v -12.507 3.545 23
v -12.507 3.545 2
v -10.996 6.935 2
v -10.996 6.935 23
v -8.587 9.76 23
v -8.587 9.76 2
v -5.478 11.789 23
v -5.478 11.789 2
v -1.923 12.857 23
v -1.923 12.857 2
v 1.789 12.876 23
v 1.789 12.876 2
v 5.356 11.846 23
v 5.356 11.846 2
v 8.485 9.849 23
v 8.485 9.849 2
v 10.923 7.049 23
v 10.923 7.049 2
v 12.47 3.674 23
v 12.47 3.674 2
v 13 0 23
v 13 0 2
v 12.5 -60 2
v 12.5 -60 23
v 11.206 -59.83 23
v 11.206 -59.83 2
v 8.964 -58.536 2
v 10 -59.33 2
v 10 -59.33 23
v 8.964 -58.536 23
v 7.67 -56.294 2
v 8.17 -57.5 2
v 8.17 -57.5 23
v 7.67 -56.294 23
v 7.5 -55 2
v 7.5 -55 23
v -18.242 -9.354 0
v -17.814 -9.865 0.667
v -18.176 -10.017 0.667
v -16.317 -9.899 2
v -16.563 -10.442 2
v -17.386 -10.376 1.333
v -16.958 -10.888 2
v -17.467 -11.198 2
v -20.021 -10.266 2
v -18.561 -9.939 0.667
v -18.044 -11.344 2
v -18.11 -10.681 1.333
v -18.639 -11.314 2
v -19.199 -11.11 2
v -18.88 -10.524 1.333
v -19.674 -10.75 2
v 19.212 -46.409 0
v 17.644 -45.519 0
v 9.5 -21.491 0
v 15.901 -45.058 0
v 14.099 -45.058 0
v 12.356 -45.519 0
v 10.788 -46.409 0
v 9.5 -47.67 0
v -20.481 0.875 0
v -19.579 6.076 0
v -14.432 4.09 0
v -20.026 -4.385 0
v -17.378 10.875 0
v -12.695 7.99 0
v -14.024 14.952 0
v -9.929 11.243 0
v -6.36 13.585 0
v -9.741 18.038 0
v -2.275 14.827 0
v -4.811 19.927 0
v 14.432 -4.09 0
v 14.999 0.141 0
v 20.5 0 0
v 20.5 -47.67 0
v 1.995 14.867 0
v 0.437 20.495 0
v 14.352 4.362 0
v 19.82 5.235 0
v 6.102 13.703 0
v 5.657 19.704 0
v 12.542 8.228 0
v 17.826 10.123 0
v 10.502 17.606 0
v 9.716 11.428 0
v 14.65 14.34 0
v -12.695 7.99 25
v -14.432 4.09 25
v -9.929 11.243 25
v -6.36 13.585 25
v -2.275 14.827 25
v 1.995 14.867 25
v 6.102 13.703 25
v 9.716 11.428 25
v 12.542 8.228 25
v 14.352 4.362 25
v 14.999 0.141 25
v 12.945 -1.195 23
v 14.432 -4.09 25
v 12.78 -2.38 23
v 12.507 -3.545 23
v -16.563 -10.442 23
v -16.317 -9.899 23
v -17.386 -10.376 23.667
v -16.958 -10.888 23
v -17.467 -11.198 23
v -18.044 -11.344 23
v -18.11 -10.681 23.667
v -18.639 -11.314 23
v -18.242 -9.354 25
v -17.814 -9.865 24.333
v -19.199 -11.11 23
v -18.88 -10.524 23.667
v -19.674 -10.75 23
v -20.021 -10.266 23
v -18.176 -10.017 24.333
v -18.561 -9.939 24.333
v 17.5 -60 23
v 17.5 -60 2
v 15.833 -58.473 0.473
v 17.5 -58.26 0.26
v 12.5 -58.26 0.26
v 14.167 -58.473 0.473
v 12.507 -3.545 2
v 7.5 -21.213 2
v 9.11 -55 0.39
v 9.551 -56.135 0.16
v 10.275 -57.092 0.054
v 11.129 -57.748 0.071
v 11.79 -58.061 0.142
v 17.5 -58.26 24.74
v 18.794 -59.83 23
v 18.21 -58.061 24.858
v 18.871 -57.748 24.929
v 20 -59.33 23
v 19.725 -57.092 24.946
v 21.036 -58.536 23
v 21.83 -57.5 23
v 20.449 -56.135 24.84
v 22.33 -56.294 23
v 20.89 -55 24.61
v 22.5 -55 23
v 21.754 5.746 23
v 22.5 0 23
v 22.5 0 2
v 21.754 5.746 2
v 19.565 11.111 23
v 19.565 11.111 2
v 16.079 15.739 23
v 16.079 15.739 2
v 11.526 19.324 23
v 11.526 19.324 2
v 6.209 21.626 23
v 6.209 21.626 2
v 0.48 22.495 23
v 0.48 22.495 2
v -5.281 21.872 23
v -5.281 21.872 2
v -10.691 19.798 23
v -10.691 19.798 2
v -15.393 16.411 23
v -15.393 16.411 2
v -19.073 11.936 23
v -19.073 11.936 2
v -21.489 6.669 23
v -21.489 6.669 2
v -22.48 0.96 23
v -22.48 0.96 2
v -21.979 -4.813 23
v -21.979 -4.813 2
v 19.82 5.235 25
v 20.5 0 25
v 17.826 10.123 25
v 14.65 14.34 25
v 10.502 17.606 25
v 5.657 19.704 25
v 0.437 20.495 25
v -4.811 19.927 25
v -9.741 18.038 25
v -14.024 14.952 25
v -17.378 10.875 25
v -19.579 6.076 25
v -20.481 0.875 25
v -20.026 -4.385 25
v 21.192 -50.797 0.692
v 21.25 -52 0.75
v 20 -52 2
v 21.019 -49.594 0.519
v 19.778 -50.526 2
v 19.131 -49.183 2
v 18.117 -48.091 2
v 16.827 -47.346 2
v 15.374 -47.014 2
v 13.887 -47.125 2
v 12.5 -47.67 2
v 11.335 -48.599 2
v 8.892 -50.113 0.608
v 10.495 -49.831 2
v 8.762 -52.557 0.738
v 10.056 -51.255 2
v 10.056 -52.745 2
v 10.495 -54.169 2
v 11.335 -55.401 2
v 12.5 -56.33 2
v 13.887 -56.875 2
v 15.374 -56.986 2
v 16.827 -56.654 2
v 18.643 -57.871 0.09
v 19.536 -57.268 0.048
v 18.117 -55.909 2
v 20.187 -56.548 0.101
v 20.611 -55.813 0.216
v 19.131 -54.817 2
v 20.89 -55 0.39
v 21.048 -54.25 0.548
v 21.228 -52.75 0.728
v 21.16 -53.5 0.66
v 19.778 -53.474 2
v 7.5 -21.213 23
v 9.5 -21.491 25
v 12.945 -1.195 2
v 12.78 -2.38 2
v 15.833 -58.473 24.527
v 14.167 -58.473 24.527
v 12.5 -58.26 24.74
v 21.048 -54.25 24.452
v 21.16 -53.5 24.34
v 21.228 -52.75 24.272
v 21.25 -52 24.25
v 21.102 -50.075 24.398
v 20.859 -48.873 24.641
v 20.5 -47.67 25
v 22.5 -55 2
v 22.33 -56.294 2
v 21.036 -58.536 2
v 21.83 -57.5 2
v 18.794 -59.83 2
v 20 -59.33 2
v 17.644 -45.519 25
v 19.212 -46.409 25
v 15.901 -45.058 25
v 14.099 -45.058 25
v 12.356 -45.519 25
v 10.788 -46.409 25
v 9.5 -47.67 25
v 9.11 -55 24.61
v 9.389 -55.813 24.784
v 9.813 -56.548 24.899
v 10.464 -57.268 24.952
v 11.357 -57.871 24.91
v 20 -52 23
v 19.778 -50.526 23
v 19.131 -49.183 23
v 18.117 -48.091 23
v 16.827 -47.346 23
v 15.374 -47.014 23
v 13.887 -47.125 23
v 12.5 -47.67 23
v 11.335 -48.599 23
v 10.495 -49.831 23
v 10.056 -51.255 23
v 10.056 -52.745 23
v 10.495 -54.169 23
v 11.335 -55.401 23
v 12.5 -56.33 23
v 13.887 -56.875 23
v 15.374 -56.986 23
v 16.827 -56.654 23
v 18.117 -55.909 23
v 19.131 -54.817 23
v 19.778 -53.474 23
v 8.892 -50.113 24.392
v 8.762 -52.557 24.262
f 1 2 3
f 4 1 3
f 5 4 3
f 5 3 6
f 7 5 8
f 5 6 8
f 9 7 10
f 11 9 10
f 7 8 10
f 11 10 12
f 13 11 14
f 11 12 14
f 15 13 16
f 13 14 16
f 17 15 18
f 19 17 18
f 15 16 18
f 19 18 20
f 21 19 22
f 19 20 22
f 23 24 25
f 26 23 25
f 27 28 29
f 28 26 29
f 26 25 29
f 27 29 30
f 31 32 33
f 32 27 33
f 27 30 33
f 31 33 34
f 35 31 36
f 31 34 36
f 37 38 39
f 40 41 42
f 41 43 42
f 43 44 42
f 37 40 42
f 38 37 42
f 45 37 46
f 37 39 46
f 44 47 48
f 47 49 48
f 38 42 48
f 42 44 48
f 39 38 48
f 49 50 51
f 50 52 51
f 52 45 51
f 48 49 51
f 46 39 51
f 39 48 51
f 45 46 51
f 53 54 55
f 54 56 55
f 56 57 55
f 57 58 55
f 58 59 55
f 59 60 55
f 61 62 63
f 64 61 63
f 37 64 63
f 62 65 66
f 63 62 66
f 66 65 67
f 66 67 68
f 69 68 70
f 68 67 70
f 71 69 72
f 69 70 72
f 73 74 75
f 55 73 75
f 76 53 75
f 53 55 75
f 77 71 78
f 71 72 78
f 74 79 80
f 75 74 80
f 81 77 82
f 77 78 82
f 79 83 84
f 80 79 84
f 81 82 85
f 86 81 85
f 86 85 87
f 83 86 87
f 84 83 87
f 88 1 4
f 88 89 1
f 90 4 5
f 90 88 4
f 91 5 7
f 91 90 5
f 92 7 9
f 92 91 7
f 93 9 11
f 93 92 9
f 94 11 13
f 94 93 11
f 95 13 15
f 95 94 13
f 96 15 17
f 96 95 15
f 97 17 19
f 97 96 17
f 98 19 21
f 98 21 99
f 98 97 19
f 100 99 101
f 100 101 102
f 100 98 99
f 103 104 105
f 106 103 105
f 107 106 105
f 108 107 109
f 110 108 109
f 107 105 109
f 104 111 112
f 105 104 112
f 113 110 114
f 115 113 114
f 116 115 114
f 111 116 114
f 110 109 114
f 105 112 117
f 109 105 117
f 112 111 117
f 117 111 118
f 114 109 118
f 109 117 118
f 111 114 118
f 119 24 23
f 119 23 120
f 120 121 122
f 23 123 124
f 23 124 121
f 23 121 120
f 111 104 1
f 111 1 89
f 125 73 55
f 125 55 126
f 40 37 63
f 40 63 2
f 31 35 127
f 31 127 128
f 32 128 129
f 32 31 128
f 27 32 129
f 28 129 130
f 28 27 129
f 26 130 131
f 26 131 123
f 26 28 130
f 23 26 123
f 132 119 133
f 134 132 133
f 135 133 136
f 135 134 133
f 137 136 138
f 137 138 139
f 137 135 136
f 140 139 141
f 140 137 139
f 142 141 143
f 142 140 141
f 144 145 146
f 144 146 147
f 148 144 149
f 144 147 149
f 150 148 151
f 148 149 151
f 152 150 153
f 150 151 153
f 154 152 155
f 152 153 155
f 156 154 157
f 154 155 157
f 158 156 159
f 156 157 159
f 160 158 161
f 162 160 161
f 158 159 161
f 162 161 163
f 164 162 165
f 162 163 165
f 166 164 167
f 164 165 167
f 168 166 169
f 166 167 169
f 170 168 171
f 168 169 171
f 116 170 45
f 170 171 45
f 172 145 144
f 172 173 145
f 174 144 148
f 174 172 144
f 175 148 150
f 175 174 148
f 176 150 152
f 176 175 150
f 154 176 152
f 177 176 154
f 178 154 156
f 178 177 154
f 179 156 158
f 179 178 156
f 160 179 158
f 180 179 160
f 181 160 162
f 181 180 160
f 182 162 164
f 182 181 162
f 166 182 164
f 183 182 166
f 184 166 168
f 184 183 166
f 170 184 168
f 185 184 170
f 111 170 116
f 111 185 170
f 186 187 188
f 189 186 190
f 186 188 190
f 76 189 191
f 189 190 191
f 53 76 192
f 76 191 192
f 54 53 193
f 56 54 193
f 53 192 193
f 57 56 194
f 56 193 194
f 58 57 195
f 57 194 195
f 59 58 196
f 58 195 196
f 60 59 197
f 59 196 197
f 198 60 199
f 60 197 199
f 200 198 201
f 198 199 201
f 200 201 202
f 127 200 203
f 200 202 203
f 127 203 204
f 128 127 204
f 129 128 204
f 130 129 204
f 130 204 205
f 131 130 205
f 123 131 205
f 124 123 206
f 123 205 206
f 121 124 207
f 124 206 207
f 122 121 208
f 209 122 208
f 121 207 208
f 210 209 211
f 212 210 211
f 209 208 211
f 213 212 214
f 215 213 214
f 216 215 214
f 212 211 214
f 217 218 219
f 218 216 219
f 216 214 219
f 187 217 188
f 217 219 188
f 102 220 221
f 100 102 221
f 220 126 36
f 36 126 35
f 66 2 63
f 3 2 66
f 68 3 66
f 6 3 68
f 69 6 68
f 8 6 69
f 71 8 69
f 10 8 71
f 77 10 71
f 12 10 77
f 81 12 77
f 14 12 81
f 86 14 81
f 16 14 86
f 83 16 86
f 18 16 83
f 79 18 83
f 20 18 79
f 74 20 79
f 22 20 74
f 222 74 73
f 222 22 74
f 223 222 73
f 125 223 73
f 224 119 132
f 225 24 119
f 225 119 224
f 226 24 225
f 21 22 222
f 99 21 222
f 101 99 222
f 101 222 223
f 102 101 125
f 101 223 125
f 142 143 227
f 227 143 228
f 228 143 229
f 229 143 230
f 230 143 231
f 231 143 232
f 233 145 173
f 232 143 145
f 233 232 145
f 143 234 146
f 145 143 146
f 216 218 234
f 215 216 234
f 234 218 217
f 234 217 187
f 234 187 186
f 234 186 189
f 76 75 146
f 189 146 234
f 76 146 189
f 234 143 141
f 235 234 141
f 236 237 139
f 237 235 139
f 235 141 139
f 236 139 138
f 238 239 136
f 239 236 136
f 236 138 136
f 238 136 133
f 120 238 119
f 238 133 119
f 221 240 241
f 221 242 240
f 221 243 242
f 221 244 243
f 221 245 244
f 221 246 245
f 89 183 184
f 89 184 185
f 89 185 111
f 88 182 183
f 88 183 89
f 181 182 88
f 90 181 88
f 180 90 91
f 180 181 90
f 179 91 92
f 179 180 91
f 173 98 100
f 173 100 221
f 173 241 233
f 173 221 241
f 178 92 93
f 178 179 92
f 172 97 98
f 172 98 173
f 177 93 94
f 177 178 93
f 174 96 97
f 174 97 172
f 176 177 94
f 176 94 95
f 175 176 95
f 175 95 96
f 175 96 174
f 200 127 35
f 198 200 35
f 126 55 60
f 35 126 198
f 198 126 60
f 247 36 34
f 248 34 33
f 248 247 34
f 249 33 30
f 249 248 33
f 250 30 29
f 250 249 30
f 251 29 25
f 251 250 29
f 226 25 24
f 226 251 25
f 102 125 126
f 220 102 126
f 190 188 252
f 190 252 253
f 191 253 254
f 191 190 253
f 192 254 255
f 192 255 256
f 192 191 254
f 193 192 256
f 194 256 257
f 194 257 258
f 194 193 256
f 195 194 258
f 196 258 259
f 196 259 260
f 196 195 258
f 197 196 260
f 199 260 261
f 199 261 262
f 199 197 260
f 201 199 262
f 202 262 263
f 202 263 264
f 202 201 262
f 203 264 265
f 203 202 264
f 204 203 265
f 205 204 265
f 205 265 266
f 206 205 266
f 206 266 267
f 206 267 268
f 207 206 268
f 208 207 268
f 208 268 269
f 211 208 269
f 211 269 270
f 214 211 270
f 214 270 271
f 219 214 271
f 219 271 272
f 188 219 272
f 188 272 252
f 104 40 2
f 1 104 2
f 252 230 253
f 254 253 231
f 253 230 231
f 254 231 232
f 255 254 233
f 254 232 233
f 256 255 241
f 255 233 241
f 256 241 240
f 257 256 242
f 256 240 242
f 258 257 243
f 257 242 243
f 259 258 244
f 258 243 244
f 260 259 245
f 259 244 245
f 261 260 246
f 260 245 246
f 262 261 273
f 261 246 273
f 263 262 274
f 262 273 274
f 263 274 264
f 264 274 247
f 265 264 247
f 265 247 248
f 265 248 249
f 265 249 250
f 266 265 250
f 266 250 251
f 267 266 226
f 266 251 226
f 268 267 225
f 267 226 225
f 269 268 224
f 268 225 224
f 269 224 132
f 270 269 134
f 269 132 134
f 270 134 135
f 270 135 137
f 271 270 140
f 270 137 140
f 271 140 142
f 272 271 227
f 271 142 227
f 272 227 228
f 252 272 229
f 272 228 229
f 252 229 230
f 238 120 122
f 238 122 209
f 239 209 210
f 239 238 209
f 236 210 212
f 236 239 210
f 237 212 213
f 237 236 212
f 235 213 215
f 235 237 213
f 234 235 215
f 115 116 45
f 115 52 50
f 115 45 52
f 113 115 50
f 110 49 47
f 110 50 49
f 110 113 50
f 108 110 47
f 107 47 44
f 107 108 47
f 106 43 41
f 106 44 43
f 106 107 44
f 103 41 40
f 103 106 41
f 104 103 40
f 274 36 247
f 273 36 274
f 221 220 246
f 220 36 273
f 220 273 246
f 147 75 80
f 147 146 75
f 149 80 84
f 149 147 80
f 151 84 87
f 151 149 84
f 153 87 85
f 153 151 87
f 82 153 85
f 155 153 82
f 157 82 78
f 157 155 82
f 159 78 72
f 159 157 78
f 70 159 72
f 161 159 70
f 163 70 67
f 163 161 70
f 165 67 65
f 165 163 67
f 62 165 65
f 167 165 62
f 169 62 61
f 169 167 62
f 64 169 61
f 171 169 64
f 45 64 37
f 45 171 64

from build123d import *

# Parameters (mm, degrees)
F0_R         = 5
F1_DEPTH     = 25
F2_R         = 5
F3_R         = 2
F4_T1_DEPTH  = 13.9731886125
F4_T3_DEPTH  = 27.1080898313
F4_T5_DEPTH  = 55
F4_T7_DEPTH  = 42.5305187235
F4_T9_DEPTH  = 5
F4_T12_ANGLE = 137.0297160683
F4_T14_ANGLE = 180
F4_T16_ANGLE = 207.1471098896
F4_T18_ANGLE = 90
F4_T20_ANGLE = 90
F4_T24_ANGLE = 137.0297160683
F4_T26_ANGLE = 180
F4_T28_ANGLE = 207.1471098896
F4_T30_ANGLE = 90
F4_T32_ANGLE = 90


# Not quite as in the source:
# - a fillet or chamfer that OpenCascade refuses, or shapes differently, is made with other operations: its cross-section is extruded or revolved along the edge and cut away or added


with BuildPart() as f1:
    # F0 (on Top) → F1 (new body)
    with BuildSketch(Plane.XY):
        with BuildLine():
            ThreePointArc((7.5, -21.2132034356), (18.3711730709, -12.9903810568), (22.5, 0))
            ThreePointArc((22.5, 0), (-7.4888899158, 21.2171281711), (-17.5148024737, -14.1237988625))
            Line((-17.5148024737, -14.1237988625), (-12.5074012369, 3.5447022866))
            ThreePointArc((-12.5074012369, 3.5447022866), (1.7893831229, 12.8762614155), (13, 0))
            ThreePointArc((13, 0), (12.8762614155, -1.7893831229), (12.5074012369, -3.5447022866))
            Line((12.5074012369, -3.5447022866), (7.5, -21.2132034356))
        make_face()
        with BuildLine():
            Line((22.5, -60), (22.5, 0))
            ThreePointArc((22.5, 0), (18.3711730709, -12.9903810568), (7.5, -21.2132034356))
            Line((7.5, -21.2132034356), (7.5, -60))
            Line((7.5, -60), (22.5, -60))
        make_face()
        with Locations((15, -52)):
            Circle(F0_R, mode=Mode.SUBTRACT)
    extrude(amount=F1_DEPTH)

    # F2
    f2_edges = [f1.edges().sort_by_distance(p)[0] for p in [
        (22.5, -60, 12.5),
        (7.5, -60, 12.5),
    ]]
    fillet(f2_edges, radius=F2_R)

    # F3
    f3_edges = [f1.edges().sort_by_distance(p)[0] for p in [
        (-17.514802, -14.123799, 12.5),
    ]]
    fillet(f3_edges, radius=F3_R)

    # F4: chamfer of 2 on 22 edges, made by hand

    # F4_s2 → F4_t1 (cut)
    with BuildSketch(Plane(origin=(-3.8100610481, -13.4437135796, 0), x_dir=(0, 0, 1), z_dir=(0.2726694067, 0.9621077875, 0))):
        Polygon((23, -13), (25, -15), (25, -13), align=None)
        Polygon((0, -15), (2, -13), (0, -13), align=None)
    extrude(amount=F4_T1_DEPTH, mode=Mode.SUBTRACT)

    # F4_s4 → F4_t3 (cut)
    with BuildSketch(Plane(origin=(0, 0, 0), x_dir=(0, 0, 1), z_dir=(-0.2726694067, -0.9621077875, 0))):
        Polygon((23, -13), (25, -15), (25, -13), align=None)
        Polygon((0, -15), (2, -13), (0, -13), align=None)
    extrude(amount=F4_T3_DEPTH, mode=Mode.SUBTRACT)

    # F4_s6 → F4_t5 (cut)
    with BuildSketch(Plane.XZ):
        Polygon((22.5, 23), (20.5, 25), (22.5, 25), align=None)
        Polygon((20.5, 0), (22.5, 2), (22.5, 0), align=None)
    extrude(amount=F4_T5_DEPTH, mode=Mode.SUBTRACT)

    # F4_s8 → F4_t7 (cut)
    with BuildSketch(Plane.XZ.offset(12.4694812765)):
        Polygon((7.5, 23), (9.5, 25), (7.5, 25), align=None)
        Polygon((9.5, 0), (7.5, 2), (7.5, 0), align=None)
    extrude(amount=F4_T7_DEPTH, mode=Mode.SUBTRACT)

    # F4_s10 → F4_t9 (cut)
    with BuildSketch(Plane.YZ.offset(12.5)):
        Polygon((-60, 23), (-58, 25), (-60, 25), align=None)
        Polygon((-58, 0), (-60, 2), (-60, 0), align=None)
    extrude(amount=F4_T9_DEPTH, mode=Mode.SUBTRACT)

    # F4_s11 → F4_t12 (revolve, cut)
    with BuildSketch(Plane(origin=(-3.8100610481, -13.4437135796, 0), x_dir=(0, 0, 1), z_dir=(0.2726694067, 0.9621077875, 0))):
        Polygon((23, -13), (25, -15), (25, -13), align=None)
    revolve(axis=Axis((-18.2416778599, -9.3536724797, 25), (0, 0, -1)), revolution_arc=F4_T12_ANGLE, mode=Mode.SUBTRACT)

    # F4_s13 → F4_t14 (revolve, cut)
    with BuildSketch(Plane(origin=(0, 0, 0), x_dir=(0, 0, 1), z_dir=(-0.2726694067, -0.9621077875, 0))):
        Polygon((23, 13), (25, 15), (25, 13), align=None)
    revolve(axis=Axis((0, 0, 25), (0, 0, -1)), revolution_arc=F4_T14_ANGLE, mode=Mode.SUBTRACT)

    # F4_s15 → F4_t16 (revolve, cut)
    with BuildSketch(Plane.XZ):
        Polygon((22.5, 23), (20.5, 25), (22.5, 25), align=None)
    revolve(axis=Axis((0, 0, 25), (0, 0, 1)), revolution_arc=F4_T16_ANGLE, mode=Mode.SUBTRACT)

    # F4_s17 → F4_t18 (revolve, cut)
    with BuildSketch(Plane.YZ.offset(17.5)):
        Polygon((-60, 23), (-58, 25), (-60, 25), align=None)
    revolve(axis=Axis((17.5, -55, 25), (0, 0, 1)), revolution_arc=F4_T18_ANGLE, mode=Mode.SUBTRACT)

    # F4_s19 → F4_t20 (revolve, cut)
    with BuildSketch(Plane.XZ.offset(55)):
        Polygon((7.5, 23), (9.5, 25), (7.5, 25), align=None)
    revolve(axis=Axis((12.5, -55, 25), (0, 0, 1)), revolution_arc=F4_T20_ANGLE, mode=Mode.SUBTRACT)

    # F4_s21 → F4_t22 (revolve, cut)
    with BuildSketch(Plane.XZ.offset(52)):
        Polygon((20, 23), (22, 25), (20, 25), align=None)
    revolve(axis=Axis((15, -52, 25), (0, 0, 1)), mode=Mode.SUBTRACT)

    # F4_s23 → F4_t24 (revolve, cut)
    with BuildSketch(Plane(origin=(-3.8100610481, -13.4437135796, 0), x_dir=(0, 0, 1), z_dir=(0.2726694067, 0.9621077875, 0))):
        Polygon((0, -15), (2, -13), (0, -13), align=None)
    revolve(axis=Axis((-18.2416778599, -9.3536724797, 0), (0, 0, -1)), revolution_arc=F4_T24_ANGLE, mode=Mode.SUBTRACT)

    # F4_s25 → F4_t26 (revolve, cut)
    with BuildSketch(Plane(origin=(0, 0, 0), x_dir=(0, 0, 1), z_dir=(-0.2726694067, -0.9621077875, 0))):
        Polygon((0, 15), (2, 13), (0, 13), align=None)
    revolve(axis=Axis((0, 0, 0), (0, 0, -1)), revolution_arc=F4_T26_ANGLE, mode=Mode.SUBTRACT)

    # F4_s27 → F4_t28 (revolve, cut)
    with BuildSketch(Plane.XZ):
        Polygon((20.5, 0), (22.5, 2), (22.5, 0), align=None)
    revolve(axis=Axis((0, 0, 0), (0, 0, 1)), revolution_arc=F4_T28_ANGLE, mode=Mode.SUBTRACT)

    # F4_s29 → F4_t30 (revolve, cut)
    with BuildSketch(Plane.YZ.offset(17.5)):
        Polygon((-58, 0), (-60, 2), (-60, 0), align=None)
    revolve(axis=Axis((17.5, -55, 0), (0, 0, 1)), revolution_arc=F4_T30_ANGLE, mode=Mode.SUBTRACT)

    # F4_s31 → F4_t32 (revolve, cut)
    with BuildSketch(Plane.XZ.offset(55)):
        Polygon((9.5, 0), (7.5, 2), (7.5, 0), align=None)
    revolve(axis=Axis((12.5, -55, 0), (0, 0, 1)), revolution_arc=F4_T32_ANGLE, mode=Mode.SUBTRACT)

    # F4_s33 → F4_t34 (revolve, cut)
    with BuildSketch(Plane.XZ.offset(52)):
        Polygon((22, 0), (20, 2), (20, 0), align=None)
    revolve(axis=Axis((15, -52, 0), (0, 0, 1)), mode=Mode.SUBTRACT)


solid = f1.part
